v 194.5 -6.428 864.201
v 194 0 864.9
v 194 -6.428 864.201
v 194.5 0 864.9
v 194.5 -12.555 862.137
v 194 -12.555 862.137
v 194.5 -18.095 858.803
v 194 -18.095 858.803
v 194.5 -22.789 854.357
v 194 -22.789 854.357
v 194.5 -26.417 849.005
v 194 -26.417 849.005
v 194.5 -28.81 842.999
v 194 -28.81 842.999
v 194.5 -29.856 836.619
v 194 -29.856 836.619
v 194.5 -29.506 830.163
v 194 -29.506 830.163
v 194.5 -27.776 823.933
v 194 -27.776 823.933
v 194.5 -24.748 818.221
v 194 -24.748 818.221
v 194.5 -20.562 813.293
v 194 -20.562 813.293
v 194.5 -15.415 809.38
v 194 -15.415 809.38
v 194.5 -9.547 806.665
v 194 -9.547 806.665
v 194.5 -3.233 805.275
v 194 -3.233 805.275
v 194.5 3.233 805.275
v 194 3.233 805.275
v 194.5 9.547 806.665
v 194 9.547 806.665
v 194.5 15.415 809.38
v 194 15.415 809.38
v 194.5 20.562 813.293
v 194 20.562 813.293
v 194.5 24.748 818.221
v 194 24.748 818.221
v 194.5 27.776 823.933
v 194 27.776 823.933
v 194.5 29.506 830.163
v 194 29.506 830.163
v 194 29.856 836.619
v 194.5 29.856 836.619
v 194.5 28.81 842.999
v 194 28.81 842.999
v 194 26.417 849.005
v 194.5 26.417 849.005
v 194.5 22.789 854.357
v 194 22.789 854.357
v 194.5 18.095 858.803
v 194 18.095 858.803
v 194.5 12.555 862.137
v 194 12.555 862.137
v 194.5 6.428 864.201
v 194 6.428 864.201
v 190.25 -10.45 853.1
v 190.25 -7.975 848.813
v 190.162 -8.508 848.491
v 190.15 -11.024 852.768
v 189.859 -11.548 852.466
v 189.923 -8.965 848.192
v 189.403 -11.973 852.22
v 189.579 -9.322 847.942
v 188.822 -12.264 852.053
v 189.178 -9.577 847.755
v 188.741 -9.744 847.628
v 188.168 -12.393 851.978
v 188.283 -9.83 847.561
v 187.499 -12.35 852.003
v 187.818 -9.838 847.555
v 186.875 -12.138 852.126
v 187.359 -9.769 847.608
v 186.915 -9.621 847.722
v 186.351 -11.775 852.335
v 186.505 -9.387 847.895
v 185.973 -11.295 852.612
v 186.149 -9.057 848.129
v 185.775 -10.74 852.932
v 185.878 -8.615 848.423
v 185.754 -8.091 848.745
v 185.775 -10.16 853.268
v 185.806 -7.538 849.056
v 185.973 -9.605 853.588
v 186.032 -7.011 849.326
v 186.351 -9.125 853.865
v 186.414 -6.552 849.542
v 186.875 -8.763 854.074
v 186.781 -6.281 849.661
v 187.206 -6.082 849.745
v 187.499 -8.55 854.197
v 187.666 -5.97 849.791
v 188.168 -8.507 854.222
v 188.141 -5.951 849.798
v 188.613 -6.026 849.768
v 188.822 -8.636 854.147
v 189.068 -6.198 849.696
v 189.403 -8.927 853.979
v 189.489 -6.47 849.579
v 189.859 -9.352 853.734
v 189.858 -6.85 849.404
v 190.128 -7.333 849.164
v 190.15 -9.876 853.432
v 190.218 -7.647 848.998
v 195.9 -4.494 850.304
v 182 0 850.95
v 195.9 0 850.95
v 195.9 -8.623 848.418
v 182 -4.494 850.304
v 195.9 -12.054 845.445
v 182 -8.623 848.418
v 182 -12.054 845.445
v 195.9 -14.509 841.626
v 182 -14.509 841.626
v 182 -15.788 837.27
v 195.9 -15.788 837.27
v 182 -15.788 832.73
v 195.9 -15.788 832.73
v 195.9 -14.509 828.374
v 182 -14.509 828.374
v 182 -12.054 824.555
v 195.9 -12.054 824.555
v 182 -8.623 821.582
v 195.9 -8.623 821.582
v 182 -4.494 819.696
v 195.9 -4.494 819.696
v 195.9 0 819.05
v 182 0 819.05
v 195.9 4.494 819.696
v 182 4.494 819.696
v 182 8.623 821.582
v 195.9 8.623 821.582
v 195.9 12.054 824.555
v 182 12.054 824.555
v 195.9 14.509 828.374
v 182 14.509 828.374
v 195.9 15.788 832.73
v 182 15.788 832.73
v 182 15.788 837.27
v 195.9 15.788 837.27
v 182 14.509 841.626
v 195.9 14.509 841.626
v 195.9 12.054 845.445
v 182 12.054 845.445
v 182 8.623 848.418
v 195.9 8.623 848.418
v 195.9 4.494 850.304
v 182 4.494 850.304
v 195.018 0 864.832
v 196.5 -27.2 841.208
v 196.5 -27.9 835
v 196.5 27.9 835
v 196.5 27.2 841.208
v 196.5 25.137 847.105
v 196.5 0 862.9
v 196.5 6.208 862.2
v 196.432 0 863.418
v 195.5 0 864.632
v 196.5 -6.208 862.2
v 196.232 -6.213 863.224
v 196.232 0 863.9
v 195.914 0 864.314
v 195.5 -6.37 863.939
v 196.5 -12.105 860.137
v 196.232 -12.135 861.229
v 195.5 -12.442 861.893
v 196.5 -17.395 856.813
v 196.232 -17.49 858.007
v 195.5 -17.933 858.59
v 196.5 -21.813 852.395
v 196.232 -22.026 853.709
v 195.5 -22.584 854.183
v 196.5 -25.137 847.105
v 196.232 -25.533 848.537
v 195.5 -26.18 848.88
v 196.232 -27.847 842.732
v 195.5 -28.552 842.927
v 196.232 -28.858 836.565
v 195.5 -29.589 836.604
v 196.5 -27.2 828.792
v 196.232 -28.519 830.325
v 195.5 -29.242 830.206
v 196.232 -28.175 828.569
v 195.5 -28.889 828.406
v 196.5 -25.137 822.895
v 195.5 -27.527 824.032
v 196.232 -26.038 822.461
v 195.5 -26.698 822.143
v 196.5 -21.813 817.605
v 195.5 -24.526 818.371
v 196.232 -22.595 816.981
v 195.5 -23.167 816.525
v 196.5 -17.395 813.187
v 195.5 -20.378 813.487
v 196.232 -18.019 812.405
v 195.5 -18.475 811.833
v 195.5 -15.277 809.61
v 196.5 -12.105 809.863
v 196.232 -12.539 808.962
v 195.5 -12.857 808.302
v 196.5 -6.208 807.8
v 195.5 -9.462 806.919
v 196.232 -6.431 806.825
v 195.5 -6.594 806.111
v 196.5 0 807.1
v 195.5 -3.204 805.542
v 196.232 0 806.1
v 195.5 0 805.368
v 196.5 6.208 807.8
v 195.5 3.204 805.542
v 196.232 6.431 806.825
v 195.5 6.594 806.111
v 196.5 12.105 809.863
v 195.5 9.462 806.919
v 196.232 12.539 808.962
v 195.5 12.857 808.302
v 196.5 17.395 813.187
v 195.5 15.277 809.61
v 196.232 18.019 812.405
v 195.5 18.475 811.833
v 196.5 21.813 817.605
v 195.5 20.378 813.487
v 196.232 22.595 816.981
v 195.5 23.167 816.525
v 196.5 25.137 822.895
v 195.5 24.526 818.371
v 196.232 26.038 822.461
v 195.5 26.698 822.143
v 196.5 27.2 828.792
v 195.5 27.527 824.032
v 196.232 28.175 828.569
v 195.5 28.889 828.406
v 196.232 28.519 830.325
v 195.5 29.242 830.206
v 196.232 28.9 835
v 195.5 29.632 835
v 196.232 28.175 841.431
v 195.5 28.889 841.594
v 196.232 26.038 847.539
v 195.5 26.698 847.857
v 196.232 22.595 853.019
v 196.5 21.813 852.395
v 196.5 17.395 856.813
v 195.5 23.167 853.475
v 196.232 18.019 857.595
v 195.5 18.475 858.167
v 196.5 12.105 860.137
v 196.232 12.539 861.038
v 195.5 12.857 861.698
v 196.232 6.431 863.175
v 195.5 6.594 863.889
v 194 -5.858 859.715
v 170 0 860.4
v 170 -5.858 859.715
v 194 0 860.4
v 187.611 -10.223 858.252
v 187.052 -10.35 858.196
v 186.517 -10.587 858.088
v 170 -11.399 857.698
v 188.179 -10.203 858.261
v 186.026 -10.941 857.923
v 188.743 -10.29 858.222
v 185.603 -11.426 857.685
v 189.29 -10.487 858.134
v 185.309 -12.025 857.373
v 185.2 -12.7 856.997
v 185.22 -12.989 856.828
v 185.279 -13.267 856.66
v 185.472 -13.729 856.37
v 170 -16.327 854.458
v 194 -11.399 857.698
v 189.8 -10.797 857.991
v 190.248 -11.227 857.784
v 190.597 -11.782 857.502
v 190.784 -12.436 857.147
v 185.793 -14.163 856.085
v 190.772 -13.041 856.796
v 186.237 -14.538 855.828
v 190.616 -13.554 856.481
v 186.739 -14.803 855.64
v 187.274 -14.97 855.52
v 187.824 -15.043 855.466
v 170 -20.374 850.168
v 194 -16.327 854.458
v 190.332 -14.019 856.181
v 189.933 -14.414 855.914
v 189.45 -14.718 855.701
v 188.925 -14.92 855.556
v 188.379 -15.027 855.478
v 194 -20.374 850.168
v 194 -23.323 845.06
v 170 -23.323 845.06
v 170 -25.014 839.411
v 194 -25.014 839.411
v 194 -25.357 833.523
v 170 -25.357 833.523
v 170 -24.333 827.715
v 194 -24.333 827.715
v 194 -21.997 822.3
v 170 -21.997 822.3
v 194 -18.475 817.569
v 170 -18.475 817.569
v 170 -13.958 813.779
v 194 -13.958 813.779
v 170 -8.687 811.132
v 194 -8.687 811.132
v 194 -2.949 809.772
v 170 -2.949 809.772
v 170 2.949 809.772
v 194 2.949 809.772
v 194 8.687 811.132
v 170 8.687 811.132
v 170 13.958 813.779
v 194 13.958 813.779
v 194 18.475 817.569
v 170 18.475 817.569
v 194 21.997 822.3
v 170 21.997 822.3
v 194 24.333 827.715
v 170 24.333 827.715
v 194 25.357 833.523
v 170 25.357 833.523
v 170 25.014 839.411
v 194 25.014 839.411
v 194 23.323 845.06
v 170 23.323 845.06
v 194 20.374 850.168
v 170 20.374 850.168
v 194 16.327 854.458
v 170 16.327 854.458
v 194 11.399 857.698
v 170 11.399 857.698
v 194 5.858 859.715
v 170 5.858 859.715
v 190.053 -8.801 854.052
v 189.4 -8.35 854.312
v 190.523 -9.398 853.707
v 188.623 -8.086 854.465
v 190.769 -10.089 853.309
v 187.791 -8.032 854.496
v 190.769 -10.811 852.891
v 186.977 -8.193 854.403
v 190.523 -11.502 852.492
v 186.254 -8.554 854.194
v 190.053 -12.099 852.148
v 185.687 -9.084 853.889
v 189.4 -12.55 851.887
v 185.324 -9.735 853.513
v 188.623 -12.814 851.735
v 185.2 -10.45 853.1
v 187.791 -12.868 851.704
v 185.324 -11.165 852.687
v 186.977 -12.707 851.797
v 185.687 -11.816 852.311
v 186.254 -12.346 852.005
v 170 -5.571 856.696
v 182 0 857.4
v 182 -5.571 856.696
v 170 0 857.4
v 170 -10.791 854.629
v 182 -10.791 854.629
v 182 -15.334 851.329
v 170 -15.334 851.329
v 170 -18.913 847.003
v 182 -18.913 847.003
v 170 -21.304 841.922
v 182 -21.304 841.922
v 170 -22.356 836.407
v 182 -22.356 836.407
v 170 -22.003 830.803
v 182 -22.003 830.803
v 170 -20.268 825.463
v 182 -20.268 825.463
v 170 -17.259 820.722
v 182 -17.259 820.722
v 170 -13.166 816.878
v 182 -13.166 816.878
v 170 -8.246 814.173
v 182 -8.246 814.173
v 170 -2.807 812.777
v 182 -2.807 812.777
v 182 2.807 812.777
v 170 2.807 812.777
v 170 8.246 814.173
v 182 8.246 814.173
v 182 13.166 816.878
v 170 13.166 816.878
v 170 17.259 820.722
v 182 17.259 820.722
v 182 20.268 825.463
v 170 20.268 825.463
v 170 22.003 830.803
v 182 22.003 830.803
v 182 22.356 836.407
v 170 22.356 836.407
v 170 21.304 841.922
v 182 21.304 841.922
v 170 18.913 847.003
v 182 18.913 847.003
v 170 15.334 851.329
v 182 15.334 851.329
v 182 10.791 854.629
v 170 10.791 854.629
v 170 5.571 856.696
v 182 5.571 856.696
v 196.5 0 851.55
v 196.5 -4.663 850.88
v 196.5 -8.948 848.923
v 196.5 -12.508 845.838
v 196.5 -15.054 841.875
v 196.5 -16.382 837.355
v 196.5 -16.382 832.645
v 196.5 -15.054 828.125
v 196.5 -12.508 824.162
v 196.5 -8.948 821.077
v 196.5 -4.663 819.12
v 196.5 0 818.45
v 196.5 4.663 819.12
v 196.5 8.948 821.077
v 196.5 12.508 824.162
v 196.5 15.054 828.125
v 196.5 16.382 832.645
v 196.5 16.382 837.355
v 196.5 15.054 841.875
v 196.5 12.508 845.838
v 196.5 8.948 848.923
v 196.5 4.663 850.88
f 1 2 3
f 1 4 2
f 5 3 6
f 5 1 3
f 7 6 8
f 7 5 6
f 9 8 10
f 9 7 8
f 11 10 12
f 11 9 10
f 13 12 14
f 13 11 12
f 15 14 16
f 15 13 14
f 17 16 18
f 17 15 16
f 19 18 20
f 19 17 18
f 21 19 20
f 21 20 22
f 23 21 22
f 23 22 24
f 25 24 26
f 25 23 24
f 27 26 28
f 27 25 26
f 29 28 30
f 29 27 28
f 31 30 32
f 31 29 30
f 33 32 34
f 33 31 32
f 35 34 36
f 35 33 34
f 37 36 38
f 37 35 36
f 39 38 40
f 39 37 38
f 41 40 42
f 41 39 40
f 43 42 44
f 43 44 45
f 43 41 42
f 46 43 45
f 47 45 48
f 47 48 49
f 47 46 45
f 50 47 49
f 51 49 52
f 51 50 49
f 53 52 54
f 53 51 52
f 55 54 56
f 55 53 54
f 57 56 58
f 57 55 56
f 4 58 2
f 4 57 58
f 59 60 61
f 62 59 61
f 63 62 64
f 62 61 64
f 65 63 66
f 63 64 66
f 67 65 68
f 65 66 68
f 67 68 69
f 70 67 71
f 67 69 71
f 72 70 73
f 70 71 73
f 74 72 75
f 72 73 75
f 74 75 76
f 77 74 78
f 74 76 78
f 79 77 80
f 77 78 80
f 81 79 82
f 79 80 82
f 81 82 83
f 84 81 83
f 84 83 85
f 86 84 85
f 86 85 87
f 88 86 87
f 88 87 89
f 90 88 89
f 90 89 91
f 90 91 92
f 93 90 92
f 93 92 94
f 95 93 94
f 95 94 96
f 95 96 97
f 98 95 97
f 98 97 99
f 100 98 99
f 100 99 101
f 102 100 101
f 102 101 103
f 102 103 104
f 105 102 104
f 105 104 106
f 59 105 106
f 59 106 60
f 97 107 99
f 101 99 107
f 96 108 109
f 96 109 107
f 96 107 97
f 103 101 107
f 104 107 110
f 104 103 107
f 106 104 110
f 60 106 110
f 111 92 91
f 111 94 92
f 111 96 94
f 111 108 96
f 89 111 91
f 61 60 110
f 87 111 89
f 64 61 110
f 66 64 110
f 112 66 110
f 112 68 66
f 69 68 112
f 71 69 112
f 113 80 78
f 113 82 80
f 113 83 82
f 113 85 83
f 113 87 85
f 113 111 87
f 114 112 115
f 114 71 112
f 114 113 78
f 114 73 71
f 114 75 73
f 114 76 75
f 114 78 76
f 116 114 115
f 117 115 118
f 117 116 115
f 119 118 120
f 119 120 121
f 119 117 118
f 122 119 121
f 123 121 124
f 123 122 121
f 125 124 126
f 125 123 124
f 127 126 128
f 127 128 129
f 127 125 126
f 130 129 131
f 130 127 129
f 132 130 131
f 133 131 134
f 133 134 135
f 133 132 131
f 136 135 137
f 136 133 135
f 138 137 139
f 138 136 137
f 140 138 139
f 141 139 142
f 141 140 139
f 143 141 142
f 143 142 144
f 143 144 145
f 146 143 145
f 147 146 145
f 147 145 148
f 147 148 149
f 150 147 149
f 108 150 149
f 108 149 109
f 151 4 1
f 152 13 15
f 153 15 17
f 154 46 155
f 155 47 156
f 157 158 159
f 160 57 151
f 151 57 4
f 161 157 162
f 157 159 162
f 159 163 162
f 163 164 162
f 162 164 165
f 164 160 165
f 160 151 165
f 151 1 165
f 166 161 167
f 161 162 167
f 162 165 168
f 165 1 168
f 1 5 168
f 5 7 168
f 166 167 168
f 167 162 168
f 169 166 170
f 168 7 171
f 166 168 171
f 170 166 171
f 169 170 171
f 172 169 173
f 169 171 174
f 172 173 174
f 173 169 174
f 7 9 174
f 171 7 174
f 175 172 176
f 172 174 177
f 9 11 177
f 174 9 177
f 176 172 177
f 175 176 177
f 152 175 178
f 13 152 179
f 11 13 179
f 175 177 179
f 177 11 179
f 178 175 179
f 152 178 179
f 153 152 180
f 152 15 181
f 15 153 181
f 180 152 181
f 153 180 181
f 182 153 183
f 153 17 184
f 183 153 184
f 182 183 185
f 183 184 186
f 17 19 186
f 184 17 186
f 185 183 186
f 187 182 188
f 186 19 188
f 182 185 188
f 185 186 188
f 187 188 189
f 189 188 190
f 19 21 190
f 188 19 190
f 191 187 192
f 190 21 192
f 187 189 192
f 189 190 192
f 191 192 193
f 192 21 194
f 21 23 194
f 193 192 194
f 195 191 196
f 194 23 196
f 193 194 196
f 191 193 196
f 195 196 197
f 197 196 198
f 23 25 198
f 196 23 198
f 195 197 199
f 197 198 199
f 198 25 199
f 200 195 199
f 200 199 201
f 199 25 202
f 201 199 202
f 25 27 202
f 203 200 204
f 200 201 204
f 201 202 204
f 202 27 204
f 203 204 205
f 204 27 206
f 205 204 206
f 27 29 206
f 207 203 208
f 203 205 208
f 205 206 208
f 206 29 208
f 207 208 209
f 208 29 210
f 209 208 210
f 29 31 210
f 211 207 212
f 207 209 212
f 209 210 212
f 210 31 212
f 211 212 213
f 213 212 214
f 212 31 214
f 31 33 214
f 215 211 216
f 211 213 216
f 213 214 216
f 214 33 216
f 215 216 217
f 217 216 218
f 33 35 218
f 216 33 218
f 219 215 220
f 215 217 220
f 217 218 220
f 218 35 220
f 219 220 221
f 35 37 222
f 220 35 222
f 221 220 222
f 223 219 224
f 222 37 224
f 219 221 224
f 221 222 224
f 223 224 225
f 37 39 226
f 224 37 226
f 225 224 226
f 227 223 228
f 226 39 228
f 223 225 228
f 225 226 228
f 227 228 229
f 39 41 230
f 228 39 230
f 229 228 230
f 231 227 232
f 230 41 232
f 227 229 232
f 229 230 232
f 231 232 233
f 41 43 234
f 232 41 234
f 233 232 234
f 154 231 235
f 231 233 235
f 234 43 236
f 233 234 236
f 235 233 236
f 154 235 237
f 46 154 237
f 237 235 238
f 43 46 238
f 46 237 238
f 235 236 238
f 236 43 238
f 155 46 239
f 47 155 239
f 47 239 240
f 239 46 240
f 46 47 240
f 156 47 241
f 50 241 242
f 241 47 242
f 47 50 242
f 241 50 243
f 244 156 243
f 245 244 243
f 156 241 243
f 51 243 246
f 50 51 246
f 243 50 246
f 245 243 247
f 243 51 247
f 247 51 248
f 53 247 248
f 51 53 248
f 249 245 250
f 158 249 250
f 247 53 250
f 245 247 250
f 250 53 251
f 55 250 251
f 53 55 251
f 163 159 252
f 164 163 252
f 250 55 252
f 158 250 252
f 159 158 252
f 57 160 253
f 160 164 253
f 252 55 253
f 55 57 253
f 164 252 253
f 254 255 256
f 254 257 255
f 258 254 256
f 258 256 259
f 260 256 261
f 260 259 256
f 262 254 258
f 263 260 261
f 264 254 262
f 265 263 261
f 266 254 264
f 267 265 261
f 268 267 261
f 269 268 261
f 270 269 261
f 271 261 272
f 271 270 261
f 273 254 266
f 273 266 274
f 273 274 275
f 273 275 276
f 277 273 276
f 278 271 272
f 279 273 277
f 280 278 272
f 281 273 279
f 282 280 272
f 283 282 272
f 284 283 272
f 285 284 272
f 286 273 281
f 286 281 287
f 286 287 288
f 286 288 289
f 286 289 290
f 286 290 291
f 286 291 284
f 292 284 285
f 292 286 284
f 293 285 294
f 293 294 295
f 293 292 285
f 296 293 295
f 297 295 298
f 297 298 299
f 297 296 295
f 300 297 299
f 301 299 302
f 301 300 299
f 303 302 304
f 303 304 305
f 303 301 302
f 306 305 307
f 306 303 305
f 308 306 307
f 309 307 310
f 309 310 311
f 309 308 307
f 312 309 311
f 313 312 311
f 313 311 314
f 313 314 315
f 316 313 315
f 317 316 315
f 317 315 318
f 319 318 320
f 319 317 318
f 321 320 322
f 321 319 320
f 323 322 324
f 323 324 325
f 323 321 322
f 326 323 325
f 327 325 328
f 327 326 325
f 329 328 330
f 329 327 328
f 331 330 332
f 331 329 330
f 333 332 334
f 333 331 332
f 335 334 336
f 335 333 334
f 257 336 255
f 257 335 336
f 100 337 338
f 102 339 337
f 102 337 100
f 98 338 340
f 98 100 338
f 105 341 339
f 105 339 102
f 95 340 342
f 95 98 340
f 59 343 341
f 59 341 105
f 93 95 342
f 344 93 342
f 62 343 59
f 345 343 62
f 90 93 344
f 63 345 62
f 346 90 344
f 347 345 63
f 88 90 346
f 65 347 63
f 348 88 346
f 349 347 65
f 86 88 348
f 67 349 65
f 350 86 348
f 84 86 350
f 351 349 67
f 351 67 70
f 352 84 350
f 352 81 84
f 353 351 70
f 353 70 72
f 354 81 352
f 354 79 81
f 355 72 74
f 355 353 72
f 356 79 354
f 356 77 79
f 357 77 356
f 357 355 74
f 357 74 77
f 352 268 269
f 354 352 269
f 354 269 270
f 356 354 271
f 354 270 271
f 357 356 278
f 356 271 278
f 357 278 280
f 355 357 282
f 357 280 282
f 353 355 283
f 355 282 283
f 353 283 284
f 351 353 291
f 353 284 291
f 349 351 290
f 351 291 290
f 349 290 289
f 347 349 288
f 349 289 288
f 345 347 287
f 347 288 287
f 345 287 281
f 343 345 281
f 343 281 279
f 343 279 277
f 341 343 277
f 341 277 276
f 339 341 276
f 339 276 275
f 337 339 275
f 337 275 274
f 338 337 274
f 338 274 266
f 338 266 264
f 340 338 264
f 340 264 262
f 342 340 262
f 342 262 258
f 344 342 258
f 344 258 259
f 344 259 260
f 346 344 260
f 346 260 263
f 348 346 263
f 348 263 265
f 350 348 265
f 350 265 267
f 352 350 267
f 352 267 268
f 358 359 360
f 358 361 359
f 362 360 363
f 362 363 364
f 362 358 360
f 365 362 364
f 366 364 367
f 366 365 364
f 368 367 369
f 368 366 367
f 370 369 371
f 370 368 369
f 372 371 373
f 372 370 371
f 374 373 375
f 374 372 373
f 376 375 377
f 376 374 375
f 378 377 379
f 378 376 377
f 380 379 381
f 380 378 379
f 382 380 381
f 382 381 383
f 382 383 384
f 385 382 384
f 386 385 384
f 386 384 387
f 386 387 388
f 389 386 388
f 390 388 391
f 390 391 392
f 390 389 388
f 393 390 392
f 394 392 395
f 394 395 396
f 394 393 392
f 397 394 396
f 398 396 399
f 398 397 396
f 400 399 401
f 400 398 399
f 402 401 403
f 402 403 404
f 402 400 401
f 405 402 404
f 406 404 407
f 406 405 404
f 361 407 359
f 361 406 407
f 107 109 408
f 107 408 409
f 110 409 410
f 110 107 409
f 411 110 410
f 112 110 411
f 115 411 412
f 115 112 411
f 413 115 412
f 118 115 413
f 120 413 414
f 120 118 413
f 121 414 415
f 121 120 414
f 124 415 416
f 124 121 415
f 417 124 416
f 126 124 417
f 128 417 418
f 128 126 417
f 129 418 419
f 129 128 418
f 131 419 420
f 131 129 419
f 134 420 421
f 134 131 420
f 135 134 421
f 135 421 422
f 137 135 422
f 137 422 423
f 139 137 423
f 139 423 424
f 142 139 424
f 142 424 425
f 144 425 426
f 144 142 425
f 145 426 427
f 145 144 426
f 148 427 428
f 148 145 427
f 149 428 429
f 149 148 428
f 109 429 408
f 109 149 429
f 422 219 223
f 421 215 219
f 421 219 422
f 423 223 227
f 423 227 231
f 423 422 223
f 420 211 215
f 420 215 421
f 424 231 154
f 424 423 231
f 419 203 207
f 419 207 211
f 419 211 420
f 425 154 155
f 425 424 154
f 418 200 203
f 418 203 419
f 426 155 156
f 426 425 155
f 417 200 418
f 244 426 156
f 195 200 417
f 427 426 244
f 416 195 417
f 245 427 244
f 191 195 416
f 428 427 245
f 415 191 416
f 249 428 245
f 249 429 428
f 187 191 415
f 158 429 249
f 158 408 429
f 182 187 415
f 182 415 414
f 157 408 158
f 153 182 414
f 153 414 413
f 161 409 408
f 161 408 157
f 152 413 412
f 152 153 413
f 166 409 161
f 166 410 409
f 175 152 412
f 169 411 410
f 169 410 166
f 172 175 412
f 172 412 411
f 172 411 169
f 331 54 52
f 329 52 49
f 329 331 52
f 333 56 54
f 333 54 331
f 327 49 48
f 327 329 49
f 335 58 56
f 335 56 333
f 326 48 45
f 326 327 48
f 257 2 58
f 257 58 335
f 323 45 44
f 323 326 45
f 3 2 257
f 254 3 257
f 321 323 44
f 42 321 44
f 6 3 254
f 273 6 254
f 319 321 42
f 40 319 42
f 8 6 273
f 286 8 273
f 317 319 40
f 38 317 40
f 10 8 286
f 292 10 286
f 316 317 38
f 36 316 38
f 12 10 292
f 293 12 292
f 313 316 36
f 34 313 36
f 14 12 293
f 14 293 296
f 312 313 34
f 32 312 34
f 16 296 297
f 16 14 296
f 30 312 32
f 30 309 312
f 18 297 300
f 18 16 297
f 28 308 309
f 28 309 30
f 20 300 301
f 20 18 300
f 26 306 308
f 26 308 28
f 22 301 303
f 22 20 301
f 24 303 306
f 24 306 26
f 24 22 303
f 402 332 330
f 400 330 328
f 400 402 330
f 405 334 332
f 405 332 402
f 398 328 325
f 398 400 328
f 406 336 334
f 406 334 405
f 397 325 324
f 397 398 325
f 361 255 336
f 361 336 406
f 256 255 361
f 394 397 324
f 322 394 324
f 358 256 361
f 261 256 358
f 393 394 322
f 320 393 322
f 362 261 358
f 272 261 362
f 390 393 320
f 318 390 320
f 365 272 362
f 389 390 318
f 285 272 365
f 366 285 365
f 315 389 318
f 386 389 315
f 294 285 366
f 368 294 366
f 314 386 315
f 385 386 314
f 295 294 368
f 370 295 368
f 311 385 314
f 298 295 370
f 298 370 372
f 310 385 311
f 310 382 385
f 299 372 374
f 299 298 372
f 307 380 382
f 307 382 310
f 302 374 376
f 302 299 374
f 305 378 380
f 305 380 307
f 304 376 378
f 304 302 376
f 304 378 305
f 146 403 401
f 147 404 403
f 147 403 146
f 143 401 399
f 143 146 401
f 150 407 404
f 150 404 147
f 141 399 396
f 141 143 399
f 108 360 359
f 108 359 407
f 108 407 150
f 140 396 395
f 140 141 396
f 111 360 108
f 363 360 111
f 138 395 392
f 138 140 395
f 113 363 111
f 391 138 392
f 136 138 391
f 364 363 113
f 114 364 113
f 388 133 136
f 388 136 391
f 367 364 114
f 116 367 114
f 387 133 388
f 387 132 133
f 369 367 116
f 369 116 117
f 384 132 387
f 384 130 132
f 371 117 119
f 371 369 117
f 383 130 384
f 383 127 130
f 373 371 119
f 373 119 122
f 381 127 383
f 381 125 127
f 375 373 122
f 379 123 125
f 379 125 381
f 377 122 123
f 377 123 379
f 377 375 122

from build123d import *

# Parameters (mm, degrees)
SKETCH144_R     = 2.25
HOLE050_DEPTH   = 40.84516
SKETCH145_R     = 2.8
POCKET198_DEPTH = 4.5
CHAMFER002_SIZE = 0.6


with BuildPart() as part:
    # Sketch143 → Revolution004 (revolve)
    with BuildSketch(Plane.XZ):
        with BuildLine():
            Line((0, 25.4), (0, 29.9))
            Line((0, 29.9), (0.5, 29.9))
            ThreePointArc((2.5, 27.9), (1.914214, 29.314214), (0.5, 29.9))
            Line((2.5, 27.9), (2.5, 15.95))
            Line((2.5, 15.95), (-12, 15.95))
            Line((-12, 15.95), (-12, 22.4))
            Line((-12, 22.4), (-24, 22.4))
            Line((-24, 22.4), (-24, 25.4))
            Line((-24, 25.4), (0, 25.4))
        make_face()
    revolve(axis=Axis((0, 0, 0), (1, 0, 0)))

    # Sketch144 (on DatumPlane) → Hole050 (cut, through all)
    with BuildSketch(Plane(origin=(-6, 0, 0), x_dir=(1, 0, 0), z_dir=(0, 0.5, -0.866025))):
        Circle(SKETCH144_R)
    extrude(amount=-HOLE050_DEPTH, mode=Mode.SUBTRACT)

    # Sketch145 (on DatumPlane) → Pocket198 (cut)
    with BuildSketch(Plane(origin=(-6, -12.7, 21.997045), x_dir=(-1, 0, 0), z_dir=(0, -0.5, 0.866025))):
        Circle(SKETCH145_R)
    extrude(amount=-POCKET198_DEPTH, mode=Mode.SUBTRACT)

    # Chamfer002
    chamfer002_edges = [part.edges().sort_by_distance(p)[0] for p in [
        (2.5, 0, -15.95),
    ]]
    chamfer(chamfer002_edges, length=CHAMFER002_SIZE)


with BuildPart() as part_1:
    # Body022029 placement: moved
    add(part.part.moved(Location((194, 0, 835))))


solid = part_1.part
